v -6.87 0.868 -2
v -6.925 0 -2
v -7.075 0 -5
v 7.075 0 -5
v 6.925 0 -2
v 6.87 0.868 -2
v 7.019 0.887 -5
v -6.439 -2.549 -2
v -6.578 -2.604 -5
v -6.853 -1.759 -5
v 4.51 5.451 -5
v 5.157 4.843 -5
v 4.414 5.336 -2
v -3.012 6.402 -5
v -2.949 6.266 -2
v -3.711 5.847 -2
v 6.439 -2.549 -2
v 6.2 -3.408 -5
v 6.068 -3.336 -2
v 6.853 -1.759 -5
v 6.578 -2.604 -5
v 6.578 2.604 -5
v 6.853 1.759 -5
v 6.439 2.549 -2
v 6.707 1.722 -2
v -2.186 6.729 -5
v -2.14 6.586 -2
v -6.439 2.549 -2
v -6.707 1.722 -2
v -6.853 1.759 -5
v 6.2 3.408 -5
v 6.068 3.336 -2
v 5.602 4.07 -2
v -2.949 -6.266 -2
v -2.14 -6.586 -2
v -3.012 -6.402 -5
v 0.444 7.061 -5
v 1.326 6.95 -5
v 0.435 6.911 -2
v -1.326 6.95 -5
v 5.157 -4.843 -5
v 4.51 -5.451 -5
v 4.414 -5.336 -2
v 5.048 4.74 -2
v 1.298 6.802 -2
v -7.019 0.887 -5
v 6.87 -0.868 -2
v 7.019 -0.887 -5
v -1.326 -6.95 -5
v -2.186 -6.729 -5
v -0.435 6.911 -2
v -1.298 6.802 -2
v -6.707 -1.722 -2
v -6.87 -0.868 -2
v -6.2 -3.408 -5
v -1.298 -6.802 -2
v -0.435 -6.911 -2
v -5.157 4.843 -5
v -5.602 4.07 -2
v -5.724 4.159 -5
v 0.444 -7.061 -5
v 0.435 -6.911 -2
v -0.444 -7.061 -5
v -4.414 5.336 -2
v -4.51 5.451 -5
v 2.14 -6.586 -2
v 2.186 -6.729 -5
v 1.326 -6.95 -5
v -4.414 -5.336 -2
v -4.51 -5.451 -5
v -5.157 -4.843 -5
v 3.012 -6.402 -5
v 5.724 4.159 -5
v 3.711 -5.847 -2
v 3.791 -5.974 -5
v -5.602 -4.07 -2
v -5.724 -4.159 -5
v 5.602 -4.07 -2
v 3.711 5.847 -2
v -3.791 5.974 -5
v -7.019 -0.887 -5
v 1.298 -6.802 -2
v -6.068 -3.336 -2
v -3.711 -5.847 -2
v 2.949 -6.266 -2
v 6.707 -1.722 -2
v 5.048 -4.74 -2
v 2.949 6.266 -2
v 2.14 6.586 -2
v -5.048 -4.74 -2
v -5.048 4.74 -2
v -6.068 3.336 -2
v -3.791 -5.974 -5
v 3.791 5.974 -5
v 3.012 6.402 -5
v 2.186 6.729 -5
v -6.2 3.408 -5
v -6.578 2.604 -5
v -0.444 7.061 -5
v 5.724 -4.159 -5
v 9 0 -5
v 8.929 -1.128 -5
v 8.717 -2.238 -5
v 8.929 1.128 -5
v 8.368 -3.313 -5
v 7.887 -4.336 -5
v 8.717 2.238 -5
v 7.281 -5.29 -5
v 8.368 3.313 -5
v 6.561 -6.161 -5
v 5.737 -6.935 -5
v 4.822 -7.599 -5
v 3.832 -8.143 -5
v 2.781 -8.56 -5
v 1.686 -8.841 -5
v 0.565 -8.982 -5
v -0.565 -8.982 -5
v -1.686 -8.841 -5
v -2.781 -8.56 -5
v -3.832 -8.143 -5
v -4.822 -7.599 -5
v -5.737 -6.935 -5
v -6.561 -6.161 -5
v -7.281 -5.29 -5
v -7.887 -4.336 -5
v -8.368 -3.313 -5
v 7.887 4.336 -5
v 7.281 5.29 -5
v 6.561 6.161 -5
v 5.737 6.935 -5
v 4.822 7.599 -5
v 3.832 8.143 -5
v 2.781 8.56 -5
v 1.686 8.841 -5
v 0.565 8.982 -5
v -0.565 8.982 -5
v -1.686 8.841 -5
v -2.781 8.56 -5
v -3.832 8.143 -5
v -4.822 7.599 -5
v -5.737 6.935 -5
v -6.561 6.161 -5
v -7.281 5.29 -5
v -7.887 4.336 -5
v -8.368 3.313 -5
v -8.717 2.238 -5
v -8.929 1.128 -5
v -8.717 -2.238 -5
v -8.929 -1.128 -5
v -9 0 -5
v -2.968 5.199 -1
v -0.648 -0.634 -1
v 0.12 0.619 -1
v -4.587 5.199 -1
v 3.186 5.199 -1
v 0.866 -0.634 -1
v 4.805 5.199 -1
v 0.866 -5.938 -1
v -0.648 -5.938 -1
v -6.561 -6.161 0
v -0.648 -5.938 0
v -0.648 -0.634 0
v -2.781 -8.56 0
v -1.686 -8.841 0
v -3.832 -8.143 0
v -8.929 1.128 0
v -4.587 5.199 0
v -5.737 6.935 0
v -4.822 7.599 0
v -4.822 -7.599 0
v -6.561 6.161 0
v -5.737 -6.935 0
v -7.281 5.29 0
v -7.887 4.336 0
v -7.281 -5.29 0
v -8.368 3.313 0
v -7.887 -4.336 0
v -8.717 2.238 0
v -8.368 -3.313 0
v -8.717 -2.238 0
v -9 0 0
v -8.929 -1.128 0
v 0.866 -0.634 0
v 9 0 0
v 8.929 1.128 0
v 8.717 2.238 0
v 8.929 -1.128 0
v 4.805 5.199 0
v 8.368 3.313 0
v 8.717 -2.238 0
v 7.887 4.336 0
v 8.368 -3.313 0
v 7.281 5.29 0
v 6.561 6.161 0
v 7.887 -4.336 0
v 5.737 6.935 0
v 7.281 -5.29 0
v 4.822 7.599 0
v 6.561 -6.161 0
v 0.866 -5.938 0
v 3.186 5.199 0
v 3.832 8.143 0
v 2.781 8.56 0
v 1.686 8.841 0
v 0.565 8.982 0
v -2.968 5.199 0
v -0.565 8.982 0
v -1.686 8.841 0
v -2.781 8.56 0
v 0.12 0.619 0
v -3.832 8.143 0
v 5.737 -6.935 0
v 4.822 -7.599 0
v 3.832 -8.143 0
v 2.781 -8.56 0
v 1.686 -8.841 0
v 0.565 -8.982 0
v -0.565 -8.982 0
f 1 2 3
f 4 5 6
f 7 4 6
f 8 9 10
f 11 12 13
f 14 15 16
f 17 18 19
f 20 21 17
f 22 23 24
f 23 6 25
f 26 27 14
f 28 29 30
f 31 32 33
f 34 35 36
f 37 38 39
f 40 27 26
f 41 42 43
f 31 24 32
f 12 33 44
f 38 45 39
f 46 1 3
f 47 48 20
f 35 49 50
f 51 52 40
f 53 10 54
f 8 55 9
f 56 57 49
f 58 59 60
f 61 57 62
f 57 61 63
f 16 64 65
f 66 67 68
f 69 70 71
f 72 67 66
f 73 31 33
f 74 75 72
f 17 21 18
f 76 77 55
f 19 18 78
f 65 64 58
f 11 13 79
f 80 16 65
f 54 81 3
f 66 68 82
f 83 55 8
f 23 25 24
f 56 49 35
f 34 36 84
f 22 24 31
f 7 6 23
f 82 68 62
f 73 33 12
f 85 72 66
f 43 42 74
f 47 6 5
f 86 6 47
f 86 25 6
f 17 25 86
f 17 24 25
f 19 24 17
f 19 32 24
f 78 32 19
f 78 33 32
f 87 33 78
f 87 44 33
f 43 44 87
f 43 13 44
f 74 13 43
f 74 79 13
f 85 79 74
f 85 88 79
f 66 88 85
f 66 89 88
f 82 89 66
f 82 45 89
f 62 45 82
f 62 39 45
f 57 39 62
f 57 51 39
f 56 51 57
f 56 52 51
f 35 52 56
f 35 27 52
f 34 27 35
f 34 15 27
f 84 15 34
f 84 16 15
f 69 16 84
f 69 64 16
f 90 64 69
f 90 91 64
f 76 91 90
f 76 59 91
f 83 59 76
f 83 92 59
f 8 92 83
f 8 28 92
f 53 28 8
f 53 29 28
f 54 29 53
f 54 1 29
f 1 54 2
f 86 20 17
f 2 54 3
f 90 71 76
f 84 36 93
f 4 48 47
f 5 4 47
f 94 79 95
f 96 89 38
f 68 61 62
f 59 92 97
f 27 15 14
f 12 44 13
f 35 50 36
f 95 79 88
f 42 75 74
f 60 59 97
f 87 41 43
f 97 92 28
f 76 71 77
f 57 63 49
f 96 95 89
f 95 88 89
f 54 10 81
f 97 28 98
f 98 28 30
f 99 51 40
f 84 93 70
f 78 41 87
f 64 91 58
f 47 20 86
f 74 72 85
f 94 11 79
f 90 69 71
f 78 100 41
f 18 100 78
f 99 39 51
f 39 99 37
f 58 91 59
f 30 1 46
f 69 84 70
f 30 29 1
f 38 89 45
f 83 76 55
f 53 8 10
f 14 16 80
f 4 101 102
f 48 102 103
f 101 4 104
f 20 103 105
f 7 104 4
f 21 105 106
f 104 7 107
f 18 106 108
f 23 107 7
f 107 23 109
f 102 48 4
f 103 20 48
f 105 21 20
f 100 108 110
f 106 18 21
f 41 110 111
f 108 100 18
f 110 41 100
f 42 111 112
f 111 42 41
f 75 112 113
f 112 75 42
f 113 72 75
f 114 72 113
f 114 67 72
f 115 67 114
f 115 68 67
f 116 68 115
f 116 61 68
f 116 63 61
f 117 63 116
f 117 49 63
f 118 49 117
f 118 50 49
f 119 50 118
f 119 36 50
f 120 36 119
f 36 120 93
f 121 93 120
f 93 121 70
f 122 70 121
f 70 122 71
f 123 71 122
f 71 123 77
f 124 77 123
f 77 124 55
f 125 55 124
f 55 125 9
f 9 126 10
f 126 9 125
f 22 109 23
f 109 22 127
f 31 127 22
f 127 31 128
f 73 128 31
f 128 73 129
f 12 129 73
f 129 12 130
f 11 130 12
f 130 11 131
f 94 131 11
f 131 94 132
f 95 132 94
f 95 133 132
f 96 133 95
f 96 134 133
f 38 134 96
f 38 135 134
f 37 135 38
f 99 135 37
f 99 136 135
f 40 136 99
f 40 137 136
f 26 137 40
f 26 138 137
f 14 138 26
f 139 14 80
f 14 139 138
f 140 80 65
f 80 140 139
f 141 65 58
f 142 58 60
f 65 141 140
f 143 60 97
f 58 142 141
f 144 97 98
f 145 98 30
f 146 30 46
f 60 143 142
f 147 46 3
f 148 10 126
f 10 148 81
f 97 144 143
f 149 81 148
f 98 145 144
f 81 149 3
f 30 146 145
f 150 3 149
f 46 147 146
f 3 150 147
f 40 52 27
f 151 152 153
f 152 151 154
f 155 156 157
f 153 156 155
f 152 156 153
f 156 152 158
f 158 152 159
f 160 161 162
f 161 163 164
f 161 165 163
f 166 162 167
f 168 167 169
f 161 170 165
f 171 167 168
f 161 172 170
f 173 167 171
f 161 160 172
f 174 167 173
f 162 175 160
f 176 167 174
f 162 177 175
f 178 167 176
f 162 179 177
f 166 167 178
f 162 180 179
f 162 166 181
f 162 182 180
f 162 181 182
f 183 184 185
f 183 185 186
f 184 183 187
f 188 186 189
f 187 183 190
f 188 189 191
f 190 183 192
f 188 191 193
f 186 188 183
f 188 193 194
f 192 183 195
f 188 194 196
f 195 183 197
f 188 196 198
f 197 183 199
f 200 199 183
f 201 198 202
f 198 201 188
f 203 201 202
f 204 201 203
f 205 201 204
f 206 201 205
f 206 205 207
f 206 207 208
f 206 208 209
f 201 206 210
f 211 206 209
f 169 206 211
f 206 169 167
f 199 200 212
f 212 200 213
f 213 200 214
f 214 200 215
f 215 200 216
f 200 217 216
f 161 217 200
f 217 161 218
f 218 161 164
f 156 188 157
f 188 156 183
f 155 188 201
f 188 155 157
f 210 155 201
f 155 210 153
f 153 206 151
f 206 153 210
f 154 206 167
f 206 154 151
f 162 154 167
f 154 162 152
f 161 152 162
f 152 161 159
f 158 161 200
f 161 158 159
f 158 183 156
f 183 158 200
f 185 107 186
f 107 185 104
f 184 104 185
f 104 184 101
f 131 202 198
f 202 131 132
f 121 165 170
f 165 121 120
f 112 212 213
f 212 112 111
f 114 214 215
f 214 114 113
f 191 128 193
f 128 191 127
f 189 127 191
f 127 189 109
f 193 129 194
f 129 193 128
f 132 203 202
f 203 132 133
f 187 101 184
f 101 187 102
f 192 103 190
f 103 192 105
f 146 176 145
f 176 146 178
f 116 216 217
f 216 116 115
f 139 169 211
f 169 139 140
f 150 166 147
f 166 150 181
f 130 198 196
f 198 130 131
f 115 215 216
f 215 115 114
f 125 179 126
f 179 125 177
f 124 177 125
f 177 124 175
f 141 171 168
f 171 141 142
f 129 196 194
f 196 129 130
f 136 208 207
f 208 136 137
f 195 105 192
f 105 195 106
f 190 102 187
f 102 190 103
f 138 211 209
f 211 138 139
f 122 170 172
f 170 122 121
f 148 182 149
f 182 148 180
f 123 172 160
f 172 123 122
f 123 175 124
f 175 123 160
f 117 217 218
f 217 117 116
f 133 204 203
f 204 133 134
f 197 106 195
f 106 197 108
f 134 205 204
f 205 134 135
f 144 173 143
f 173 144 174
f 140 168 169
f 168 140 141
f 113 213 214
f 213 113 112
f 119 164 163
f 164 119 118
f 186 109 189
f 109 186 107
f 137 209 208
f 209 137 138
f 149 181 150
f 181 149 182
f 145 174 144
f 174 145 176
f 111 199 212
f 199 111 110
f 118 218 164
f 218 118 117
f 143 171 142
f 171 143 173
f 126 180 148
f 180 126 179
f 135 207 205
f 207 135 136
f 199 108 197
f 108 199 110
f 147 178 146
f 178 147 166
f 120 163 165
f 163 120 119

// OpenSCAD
$fn = 50;

difference() {
	union() {
		translate(v = [0, 0, -5.0]) {
			cylinder(h = 5, r = 9.0);
		}
	}
	union() {
		#translate(v = [0, 0, -5.0]) {
			cylinder(h = 3, r1 = 7.075, r2 = 6.925);
		}
		translate(v = [0, -0.5, -1]) {
			linear_extrude(height = 1) {
				text(font = "Webdings", halign = "center", size = 11, text = "Y", valign = "center");
			}
		}
	}
}
